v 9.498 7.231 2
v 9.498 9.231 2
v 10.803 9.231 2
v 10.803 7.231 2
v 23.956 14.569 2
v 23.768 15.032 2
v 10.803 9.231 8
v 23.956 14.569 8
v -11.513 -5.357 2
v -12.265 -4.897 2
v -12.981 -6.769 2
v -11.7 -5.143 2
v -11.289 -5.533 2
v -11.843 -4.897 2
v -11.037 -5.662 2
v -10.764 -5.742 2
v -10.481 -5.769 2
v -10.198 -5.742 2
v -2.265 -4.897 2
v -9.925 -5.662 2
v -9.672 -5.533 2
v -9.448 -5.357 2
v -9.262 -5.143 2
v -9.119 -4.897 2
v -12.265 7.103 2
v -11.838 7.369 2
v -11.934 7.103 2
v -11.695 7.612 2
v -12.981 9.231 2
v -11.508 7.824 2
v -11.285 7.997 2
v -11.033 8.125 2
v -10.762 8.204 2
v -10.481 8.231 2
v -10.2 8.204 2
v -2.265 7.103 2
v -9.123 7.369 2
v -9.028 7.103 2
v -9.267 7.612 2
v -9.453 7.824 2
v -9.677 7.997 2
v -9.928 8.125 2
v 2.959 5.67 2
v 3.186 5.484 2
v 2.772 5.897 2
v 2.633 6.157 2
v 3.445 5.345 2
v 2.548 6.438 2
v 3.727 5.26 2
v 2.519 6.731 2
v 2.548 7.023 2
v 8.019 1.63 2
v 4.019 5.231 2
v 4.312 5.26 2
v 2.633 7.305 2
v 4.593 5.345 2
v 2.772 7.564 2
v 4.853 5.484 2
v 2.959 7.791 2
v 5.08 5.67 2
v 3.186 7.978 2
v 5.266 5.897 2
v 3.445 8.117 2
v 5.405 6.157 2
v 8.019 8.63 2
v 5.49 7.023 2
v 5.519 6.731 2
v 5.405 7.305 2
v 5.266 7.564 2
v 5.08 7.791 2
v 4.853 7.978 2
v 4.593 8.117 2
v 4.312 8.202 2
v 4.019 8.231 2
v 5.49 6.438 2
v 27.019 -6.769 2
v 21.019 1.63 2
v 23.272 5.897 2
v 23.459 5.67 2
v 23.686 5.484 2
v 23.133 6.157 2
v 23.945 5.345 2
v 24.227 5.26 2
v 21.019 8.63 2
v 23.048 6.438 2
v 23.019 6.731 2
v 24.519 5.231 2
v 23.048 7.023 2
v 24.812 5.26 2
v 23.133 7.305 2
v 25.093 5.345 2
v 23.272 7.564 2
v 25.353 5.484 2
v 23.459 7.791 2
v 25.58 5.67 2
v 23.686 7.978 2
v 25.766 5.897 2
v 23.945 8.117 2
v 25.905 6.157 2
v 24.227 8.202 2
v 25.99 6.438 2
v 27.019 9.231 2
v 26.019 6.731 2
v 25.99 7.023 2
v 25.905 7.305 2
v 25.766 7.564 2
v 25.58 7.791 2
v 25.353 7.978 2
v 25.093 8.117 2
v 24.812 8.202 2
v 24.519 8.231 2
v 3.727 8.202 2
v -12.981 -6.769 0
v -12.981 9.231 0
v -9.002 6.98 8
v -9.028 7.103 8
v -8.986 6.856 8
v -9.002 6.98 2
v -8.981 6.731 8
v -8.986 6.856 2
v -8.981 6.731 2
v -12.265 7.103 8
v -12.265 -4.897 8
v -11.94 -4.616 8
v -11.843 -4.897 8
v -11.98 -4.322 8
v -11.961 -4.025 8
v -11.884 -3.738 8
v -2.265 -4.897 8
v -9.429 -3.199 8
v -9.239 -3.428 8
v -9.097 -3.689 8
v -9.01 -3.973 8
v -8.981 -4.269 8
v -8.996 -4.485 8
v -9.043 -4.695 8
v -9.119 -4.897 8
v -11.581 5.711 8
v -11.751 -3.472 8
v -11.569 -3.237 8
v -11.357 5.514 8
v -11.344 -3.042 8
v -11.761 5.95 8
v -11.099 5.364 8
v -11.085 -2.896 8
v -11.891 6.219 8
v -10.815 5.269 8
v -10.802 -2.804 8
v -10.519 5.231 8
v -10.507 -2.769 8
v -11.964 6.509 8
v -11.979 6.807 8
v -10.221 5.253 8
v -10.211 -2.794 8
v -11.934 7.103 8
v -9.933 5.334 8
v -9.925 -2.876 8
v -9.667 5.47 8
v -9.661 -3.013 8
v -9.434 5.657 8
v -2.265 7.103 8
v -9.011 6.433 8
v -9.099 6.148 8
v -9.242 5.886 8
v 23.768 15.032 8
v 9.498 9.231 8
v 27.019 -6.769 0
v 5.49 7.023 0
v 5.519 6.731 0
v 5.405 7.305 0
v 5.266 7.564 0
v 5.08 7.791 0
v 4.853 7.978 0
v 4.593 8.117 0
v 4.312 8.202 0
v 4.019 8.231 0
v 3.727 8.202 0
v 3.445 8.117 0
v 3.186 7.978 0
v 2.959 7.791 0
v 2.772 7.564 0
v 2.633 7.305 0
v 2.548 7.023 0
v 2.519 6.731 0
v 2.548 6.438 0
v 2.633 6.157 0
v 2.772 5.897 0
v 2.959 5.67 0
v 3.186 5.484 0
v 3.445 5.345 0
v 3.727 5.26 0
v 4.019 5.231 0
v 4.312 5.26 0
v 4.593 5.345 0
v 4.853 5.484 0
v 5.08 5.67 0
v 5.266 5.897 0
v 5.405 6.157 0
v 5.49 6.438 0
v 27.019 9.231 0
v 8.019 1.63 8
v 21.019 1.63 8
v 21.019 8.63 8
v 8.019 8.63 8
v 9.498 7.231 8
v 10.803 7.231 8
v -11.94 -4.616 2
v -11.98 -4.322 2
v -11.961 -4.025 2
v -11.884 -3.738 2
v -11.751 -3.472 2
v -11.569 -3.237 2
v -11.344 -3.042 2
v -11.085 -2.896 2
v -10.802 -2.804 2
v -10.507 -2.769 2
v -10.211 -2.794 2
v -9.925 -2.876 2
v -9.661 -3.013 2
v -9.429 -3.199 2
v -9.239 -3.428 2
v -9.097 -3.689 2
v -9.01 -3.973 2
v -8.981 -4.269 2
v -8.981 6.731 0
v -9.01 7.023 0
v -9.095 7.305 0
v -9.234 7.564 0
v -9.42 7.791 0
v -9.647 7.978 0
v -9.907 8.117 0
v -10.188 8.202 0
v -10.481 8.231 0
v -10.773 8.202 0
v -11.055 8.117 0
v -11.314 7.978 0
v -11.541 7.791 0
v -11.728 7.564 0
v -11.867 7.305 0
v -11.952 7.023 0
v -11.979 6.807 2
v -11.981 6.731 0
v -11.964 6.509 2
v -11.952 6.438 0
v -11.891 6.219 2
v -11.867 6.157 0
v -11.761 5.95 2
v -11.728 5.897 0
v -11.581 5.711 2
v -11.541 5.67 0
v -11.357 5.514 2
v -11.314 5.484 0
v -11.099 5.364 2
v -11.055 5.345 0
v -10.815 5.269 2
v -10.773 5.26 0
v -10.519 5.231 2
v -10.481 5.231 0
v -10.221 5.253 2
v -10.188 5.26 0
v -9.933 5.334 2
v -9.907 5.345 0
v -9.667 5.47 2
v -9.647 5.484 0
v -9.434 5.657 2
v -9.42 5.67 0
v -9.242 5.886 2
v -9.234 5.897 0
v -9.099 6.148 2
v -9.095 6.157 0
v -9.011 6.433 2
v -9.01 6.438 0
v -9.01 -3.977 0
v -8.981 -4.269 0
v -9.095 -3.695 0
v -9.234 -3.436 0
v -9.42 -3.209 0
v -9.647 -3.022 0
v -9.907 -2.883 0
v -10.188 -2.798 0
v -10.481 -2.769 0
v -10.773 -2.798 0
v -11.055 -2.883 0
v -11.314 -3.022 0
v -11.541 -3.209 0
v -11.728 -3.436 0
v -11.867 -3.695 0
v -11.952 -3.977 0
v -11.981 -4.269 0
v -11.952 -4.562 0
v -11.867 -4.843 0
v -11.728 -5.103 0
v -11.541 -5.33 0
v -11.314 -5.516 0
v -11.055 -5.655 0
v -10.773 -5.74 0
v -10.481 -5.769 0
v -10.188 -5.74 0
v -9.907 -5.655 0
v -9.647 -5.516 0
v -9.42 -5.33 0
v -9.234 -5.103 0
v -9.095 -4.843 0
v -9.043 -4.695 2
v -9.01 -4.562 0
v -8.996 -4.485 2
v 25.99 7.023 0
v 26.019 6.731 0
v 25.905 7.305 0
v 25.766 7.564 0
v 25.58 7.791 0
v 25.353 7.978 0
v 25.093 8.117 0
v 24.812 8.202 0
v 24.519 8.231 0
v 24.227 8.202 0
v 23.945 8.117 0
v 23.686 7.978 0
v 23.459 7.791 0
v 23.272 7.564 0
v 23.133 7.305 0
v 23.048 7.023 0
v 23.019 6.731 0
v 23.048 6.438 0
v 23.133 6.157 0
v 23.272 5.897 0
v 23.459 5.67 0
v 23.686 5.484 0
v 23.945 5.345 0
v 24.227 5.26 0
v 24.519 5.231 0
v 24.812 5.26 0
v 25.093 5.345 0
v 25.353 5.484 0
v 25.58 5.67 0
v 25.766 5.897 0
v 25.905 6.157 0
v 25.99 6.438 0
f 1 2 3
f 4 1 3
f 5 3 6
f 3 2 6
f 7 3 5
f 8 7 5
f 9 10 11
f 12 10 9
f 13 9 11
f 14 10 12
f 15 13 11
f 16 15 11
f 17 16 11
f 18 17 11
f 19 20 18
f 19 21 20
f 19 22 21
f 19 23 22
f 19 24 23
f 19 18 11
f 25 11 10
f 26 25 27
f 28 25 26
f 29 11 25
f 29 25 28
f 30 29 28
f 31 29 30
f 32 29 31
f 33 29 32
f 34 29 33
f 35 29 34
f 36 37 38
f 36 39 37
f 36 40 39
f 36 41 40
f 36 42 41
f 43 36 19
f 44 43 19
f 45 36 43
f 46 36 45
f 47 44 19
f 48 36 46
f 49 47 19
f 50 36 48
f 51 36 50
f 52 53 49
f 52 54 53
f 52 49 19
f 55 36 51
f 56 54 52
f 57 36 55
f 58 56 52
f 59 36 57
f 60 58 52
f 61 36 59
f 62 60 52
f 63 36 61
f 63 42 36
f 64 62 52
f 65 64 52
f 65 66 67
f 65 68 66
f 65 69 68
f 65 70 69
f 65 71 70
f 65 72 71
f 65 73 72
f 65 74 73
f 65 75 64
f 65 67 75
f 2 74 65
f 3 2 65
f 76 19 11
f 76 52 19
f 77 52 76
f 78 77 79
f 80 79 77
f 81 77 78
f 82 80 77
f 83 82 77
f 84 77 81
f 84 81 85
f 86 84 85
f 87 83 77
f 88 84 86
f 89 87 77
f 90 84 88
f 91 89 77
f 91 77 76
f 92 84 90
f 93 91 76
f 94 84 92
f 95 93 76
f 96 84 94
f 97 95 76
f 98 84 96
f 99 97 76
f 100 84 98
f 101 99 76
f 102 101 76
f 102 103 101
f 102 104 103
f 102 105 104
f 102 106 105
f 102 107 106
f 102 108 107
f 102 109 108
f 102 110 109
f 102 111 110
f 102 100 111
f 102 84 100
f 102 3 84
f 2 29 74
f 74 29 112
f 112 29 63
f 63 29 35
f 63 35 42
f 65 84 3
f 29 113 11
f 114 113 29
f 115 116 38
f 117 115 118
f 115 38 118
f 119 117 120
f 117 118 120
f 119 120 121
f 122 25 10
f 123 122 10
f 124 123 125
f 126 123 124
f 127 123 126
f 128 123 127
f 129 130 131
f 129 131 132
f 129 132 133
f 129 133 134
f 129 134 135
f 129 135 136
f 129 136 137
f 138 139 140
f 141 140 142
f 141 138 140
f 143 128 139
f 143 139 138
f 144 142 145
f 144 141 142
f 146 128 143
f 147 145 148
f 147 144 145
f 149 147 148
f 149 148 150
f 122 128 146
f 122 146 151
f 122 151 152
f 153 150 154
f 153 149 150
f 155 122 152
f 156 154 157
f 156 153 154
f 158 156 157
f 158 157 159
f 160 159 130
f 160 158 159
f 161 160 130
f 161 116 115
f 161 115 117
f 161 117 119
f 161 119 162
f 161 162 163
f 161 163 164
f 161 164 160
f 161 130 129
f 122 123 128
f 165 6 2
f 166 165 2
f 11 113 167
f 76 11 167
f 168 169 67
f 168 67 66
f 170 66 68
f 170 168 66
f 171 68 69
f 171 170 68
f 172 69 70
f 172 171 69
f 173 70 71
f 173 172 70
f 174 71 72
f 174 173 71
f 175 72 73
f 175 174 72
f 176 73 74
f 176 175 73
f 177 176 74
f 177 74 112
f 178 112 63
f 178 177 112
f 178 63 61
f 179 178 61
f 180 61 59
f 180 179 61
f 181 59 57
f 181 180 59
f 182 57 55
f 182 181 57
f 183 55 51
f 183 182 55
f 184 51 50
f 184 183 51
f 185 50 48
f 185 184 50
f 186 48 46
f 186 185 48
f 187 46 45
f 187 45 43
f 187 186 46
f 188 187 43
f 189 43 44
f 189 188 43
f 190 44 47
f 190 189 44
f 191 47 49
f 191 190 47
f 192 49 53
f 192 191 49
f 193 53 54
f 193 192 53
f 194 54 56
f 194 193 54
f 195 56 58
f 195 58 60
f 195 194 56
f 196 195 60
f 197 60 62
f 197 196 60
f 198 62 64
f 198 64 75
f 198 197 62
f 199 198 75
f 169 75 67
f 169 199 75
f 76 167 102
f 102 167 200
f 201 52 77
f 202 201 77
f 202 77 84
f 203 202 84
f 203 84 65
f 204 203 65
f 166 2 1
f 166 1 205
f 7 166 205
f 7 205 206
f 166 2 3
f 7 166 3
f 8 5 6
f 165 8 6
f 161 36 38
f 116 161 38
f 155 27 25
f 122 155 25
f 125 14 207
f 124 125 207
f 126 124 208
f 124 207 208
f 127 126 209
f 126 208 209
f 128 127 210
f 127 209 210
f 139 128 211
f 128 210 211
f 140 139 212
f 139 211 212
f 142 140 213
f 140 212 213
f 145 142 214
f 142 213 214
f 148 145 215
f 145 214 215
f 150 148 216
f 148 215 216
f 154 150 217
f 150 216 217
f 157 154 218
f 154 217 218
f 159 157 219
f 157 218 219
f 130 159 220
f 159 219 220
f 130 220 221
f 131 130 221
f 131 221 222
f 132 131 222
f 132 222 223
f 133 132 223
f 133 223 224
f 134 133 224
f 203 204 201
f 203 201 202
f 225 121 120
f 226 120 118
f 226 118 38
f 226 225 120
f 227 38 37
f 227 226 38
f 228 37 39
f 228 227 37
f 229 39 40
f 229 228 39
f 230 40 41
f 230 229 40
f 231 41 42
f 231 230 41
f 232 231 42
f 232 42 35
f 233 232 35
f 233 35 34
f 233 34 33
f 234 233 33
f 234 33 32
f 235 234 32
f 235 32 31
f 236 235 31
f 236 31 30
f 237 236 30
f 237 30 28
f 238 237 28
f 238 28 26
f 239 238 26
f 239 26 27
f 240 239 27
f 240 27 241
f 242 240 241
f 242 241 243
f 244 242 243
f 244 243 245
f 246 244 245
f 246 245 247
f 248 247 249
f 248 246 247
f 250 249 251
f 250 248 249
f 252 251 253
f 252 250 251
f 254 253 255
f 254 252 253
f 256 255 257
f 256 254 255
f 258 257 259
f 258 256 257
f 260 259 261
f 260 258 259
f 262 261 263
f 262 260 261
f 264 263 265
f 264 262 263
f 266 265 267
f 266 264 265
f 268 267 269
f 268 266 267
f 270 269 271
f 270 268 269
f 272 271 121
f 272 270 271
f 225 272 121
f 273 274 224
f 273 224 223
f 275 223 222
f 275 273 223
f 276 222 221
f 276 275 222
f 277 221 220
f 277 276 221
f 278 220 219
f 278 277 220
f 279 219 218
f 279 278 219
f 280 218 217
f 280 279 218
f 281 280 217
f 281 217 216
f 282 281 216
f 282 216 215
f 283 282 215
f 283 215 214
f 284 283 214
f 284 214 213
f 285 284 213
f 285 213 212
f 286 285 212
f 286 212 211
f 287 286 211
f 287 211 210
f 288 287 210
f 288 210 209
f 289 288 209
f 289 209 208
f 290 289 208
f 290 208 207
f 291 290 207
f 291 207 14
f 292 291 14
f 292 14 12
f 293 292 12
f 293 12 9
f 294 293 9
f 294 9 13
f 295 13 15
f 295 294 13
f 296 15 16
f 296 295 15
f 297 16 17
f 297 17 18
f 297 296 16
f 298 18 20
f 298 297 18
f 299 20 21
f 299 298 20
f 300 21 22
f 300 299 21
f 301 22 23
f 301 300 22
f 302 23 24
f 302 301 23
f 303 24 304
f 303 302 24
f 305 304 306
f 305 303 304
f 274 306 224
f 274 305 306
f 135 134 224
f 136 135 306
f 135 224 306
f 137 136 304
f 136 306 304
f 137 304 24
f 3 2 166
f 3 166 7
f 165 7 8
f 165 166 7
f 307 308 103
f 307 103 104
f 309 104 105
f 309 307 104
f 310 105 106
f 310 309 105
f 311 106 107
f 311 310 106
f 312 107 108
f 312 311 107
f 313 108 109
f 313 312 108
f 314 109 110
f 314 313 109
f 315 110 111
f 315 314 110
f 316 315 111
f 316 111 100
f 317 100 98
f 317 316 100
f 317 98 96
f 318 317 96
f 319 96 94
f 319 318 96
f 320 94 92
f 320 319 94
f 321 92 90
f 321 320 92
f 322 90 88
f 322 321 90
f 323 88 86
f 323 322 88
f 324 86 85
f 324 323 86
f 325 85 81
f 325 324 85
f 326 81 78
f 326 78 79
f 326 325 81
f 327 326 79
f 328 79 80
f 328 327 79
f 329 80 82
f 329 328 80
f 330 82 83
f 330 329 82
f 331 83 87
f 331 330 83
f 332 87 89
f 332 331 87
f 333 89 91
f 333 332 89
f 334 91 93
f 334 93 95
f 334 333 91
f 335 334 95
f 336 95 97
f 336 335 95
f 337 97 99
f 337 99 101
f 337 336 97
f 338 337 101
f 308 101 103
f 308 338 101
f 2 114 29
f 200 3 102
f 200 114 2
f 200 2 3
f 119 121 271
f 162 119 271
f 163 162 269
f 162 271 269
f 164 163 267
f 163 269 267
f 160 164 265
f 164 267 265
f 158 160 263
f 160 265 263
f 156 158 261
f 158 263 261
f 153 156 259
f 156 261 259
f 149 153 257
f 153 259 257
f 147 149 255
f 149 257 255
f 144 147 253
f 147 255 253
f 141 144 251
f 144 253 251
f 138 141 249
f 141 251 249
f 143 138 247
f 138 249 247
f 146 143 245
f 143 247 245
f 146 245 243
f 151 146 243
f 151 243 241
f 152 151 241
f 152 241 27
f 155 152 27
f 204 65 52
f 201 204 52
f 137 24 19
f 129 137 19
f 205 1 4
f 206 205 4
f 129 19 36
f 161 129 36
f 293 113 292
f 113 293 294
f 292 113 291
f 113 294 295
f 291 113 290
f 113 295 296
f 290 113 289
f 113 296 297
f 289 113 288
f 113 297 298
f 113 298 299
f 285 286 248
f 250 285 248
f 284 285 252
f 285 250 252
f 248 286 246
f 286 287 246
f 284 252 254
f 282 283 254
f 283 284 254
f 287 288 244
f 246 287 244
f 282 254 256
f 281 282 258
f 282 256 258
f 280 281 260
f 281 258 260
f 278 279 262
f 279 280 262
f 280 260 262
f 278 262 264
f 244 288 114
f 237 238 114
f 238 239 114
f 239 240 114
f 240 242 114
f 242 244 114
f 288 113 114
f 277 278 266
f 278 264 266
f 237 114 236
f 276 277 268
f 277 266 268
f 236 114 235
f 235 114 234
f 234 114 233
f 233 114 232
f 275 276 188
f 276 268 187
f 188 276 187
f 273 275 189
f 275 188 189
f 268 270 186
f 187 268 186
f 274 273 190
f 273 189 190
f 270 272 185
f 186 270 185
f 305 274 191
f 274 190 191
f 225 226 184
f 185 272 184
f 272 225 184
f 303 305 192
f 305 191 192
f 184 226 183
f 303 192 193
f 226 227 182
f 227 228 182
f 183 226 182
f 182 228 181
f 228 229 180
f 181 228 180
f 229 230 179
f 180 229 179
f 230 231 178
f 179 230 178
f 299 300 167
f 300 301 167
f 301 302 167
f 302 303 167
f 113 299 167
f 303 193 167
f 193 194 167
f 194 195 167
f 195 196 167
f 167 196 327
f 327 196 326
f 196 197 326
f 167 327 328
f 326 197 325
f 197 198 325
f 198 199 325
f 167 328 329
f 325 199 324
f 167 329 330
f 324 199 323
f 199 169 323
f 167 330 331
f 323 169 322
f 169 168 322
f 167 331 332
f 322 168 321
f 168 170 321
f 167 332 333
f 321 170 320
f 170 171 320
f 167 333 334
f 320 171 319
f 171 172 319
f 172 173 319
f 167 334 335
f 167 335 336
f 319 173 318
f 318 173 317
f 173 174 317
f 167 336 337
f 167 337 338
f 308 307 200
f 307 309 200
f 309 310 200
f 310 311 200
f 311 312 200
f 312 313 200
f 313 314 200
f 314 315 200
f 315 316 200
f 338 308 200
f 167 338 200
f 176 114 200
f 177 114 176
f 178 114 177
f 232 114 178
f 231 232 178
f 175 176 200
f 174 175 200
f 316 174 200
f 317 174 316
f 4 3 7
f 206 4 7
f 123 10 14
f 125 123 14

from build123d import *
from build123d import SkipClean  # not in build123d's __all__

# Parameters (mm, degrees)
F0_W     = 40
F0_H     = 16
F0_R     = 1.5
F1_DEPTH = 2
F3_DEPTH = 6
F4_DEPTH = 2


with BuildPart() as f1:
    # F0 (on Top) → F1 (new body)
    with BuildSketch(Plane.XY):
        with Locations((7.0192306489, 1.2307697609)):
            Rectangle(F0_W, F0_H)
        with Locations((-10.4807693511, -4.2692302391)):
            Circle(F0_R, mode=Mode.SUBTRACT)
        with Locations((-10.4807693511, 6.7307697609)):
            Circle(F0_R, mode=Mode.SUBTRACT)
        with Locations((4.0192306489, 6.7307697609)):
            Circle(F0_R, mode=Mode.SUBTRACT)
        with Locations((24.5192306489, 6.7307697609)):
            Circle(F0_R, mode=Mode.SUBTRACT)
    extrude(amount=F1_DEPTH)

    # F2 (on face) → F3 (join)
    with BuildSketch(Plane.XY.offset(2)):
        with BuildLine():
            Line((-11.9339417158, 7.102643501), (-12.2648915183, 7.102643501))
            Line((-12.2648915183, 7.102643501), (-12.2648915183, -4.897356499))
            Line((-12.2648915183, -4.897356499), (-11.8429211054, -4.897356499))
            ThreePointArc((-11.8429211054, -4.897356499), (-10.8023065718, -2.8040975435), (-8.9807693511, -4.2692302391))
            ThreePointArc((-8.9807693511, -4.2692302391), (-9.0156366555, -4.5907674598), (-9.1186175969, -4.897356499))
            Line((-9.1186175969, -4.897356499), (-2.2648915183, -4.897356499))
            Line((-2.2648915183, -4.897356499), (-2.2648915183, 7.102643501))
            Line((-2.2648915183, 7.102643501), (-9.0275969865, 7.102643501))
            ThreePointArc((-9.0275969865, 7.102643501), (-8.9925223039, 6.9181750076), (-8.9807693511, 6.7307697609))
            ThreePointArc((-8.9807693511, 6.7307697609), (-10.6681745979, 5.2425227137), (-11.9339417158, 7.102643501))
        make_face()
        Polygon((9.3223992735, 8.6297835391), (8.0192306489, 8.6297835391), (8.0192306489, 1.6297835391), (21.0192306489, 1.6297835391), (21.0192306489, 8.6297835391), align=None)
        Polygon((23.7675364597, 15.032194342), (9.4975042399, 9.2307697609), (10.8031475786, 9.2307697609), (23.9558426598, 14.569008877), align=None)
    with SkipClean():  # cleaning this boolean's faces spoils the solid; the shape is the same uncleaned
        extrude(amount=F3_DEPTH)


with BuildPart() as f4:
    # F4 (new): a face of the model
    f4_faces = [f1.part.faces().sort_by_distance(p)[0] for p in [
        (10.1503259093, 9.2307697609, 5),
    ]]
    extrude(f4_faces, amount=F4_DEPTH)


solid = Compound([f1.part, f4.part])
